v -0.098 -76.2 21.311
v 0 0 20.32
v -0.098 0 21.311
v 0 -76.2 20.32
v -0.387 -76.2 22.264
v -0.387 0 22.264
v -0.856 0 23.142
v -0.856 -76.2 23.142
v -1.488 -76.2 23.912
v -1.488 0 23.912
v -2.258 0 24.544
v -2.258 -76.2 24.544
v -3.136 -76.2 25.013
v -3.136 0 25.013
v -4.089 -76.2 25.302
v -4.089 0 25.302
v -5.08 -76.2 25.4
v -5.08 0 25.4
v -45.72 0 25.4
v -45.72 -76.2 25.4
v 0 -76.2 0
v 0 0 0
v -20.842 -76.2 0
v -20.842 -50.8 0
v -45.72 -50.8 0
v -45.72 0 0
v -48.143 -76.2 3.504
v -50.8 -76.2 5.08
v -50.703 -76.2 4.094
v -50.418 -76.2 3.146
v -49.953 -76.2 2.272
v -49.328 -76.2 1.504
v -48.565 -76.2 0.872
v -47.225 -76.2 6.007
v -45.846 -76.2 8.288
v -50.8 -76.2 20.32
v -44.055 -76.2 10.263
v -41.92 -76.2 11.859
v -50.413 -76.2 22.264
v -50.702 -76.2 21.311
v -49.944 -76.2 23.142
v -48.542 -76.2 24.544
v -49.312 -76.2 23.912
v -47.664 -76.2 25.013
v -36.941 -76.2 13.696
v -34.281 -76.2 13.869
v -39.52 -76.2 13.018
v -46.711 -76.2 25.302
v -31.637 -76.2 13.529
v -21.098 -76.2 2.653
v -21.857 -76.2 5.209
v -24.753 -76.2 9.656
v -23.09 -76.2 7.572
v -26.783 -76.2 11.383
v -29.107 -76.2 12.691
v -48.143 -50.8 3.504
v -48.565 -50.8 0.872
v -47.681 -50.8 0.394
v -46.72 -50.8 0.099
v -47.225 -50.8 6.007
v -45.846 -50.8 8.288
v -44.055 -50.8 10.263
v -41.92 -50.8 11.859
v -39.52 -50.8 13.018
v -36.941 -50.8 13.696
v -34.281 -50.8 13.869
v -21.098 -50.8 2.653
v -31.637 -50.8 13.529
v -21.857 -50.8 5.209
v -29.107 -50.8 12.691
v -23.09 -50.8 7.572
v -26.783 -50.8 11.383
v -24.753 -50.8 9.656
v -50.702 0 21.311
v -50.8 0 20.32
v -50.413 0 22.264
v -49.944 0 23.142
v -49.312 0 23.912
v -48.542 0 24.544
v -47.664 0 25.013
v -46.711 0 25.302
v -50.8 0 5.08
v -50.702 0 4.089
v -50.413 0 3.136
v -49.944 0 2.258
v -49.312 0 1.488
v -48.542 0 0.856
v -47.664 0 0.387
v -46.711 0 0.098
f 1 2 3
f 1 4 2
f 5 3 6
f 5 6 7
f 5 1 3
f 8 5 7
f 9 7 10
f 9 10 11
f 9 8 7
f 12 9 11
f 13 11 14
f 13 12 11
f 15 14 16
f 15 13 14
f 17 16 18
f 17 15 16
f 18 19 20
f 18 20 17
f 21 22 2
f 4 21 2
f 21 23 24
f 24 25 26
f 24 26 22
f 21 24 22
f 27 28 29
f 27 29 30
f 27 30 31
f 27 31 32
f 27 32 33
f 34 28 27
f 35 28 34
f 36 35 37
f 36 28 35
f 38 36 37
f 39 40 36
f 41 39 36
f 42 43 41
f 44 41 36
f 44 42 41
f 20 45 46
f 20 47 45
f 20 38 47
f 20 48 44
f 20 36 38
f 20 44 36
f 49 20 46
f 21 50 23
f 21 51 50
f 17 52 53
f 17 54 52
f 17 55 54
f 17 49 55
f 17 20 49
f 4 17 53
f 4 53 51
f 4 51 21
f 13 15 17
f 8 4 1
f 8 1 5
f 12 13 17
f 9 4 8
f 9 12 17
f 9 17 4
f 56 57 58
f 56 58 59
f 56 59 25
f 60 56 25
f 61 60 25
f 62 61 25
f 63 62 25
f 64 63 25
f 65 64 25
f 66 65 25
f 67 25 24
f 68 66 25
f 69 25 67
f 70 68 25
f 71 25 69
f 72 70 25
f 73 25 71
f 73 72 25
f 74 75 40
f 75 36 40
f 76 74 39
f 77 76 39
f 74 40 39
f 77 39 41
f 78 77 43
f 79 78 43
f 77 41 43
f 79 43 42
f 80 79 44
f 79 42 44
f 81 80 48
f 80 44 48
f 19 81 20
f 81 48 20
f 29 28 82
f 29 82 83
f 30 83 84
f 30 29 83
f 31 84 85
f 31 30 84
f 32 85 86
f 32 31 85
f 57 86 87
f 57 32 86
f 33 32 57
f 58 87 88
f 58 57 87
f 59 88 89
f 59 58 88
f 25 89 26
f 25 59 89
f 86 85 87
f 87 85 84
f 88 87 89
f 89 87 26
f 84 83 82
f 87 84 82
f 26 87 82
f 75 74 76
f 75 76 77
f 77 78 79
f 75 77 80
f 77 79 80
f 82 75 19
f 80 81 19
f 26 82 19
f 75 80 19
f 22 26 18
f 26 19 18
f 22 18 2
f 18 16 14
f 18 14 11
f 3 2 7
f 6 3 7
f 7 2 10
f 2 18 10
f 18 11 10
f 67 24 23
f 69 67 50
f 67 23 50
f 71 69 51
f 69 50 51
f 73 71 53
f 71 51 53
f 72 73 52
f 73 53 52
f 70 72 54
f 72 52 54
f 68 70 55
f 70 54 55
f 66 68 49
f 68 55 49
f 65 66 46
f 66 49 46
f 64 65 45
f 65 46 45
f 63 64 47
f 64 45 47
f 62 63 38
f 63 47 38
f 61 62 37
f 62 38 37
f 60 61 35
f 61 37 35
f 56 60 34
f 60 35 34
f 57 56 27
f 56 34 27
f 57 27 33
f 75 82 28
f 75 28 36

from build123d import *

# Parameters (mm, degrees)
F1_E0_TOP_W = 50.8
F1_E0_TOP_H = 25.4
F2_DEPTH    = 76.2
F3_R        = 5.08
F4_R        = 13.875567501
F5_DEPTH    = 25.4


with BuildPart() as f2:
    # F1_E0_top (on explicit) → F2 (new body)
    with BuildSketch(Plane(origin=(-50.8, 0, 0), x_dir=(1, 0, 0), z_dir=(0, -1, 0))):
        with Locations((25.4, 12.7)):
            Rectangle(F1_E0_TOP_W, F1_E0_TOP_H)
    extrude(amount=F2_DEPTH)

    # F3
    f3_edges = [f2.edges().sort_by_distance(p)[0] for p in [
        (-50.8, -38.1, 0),
        (-50.8, -38.1, 25.4),
        (0, -38.1, 25.4),
    ]]
    fillet(f3_edges, radius=F3_R)

    # F4 (on face) → F5 (cut)
    with BuildSketch(Plane.XZ.offset(76.2)):
        with Locations((-34.7172878683, 0)):
            Circle(F4_R)
    extrude(amount=-F5_DEPTH, mode=Mode.SUBTRACT)


solid = f2.part
